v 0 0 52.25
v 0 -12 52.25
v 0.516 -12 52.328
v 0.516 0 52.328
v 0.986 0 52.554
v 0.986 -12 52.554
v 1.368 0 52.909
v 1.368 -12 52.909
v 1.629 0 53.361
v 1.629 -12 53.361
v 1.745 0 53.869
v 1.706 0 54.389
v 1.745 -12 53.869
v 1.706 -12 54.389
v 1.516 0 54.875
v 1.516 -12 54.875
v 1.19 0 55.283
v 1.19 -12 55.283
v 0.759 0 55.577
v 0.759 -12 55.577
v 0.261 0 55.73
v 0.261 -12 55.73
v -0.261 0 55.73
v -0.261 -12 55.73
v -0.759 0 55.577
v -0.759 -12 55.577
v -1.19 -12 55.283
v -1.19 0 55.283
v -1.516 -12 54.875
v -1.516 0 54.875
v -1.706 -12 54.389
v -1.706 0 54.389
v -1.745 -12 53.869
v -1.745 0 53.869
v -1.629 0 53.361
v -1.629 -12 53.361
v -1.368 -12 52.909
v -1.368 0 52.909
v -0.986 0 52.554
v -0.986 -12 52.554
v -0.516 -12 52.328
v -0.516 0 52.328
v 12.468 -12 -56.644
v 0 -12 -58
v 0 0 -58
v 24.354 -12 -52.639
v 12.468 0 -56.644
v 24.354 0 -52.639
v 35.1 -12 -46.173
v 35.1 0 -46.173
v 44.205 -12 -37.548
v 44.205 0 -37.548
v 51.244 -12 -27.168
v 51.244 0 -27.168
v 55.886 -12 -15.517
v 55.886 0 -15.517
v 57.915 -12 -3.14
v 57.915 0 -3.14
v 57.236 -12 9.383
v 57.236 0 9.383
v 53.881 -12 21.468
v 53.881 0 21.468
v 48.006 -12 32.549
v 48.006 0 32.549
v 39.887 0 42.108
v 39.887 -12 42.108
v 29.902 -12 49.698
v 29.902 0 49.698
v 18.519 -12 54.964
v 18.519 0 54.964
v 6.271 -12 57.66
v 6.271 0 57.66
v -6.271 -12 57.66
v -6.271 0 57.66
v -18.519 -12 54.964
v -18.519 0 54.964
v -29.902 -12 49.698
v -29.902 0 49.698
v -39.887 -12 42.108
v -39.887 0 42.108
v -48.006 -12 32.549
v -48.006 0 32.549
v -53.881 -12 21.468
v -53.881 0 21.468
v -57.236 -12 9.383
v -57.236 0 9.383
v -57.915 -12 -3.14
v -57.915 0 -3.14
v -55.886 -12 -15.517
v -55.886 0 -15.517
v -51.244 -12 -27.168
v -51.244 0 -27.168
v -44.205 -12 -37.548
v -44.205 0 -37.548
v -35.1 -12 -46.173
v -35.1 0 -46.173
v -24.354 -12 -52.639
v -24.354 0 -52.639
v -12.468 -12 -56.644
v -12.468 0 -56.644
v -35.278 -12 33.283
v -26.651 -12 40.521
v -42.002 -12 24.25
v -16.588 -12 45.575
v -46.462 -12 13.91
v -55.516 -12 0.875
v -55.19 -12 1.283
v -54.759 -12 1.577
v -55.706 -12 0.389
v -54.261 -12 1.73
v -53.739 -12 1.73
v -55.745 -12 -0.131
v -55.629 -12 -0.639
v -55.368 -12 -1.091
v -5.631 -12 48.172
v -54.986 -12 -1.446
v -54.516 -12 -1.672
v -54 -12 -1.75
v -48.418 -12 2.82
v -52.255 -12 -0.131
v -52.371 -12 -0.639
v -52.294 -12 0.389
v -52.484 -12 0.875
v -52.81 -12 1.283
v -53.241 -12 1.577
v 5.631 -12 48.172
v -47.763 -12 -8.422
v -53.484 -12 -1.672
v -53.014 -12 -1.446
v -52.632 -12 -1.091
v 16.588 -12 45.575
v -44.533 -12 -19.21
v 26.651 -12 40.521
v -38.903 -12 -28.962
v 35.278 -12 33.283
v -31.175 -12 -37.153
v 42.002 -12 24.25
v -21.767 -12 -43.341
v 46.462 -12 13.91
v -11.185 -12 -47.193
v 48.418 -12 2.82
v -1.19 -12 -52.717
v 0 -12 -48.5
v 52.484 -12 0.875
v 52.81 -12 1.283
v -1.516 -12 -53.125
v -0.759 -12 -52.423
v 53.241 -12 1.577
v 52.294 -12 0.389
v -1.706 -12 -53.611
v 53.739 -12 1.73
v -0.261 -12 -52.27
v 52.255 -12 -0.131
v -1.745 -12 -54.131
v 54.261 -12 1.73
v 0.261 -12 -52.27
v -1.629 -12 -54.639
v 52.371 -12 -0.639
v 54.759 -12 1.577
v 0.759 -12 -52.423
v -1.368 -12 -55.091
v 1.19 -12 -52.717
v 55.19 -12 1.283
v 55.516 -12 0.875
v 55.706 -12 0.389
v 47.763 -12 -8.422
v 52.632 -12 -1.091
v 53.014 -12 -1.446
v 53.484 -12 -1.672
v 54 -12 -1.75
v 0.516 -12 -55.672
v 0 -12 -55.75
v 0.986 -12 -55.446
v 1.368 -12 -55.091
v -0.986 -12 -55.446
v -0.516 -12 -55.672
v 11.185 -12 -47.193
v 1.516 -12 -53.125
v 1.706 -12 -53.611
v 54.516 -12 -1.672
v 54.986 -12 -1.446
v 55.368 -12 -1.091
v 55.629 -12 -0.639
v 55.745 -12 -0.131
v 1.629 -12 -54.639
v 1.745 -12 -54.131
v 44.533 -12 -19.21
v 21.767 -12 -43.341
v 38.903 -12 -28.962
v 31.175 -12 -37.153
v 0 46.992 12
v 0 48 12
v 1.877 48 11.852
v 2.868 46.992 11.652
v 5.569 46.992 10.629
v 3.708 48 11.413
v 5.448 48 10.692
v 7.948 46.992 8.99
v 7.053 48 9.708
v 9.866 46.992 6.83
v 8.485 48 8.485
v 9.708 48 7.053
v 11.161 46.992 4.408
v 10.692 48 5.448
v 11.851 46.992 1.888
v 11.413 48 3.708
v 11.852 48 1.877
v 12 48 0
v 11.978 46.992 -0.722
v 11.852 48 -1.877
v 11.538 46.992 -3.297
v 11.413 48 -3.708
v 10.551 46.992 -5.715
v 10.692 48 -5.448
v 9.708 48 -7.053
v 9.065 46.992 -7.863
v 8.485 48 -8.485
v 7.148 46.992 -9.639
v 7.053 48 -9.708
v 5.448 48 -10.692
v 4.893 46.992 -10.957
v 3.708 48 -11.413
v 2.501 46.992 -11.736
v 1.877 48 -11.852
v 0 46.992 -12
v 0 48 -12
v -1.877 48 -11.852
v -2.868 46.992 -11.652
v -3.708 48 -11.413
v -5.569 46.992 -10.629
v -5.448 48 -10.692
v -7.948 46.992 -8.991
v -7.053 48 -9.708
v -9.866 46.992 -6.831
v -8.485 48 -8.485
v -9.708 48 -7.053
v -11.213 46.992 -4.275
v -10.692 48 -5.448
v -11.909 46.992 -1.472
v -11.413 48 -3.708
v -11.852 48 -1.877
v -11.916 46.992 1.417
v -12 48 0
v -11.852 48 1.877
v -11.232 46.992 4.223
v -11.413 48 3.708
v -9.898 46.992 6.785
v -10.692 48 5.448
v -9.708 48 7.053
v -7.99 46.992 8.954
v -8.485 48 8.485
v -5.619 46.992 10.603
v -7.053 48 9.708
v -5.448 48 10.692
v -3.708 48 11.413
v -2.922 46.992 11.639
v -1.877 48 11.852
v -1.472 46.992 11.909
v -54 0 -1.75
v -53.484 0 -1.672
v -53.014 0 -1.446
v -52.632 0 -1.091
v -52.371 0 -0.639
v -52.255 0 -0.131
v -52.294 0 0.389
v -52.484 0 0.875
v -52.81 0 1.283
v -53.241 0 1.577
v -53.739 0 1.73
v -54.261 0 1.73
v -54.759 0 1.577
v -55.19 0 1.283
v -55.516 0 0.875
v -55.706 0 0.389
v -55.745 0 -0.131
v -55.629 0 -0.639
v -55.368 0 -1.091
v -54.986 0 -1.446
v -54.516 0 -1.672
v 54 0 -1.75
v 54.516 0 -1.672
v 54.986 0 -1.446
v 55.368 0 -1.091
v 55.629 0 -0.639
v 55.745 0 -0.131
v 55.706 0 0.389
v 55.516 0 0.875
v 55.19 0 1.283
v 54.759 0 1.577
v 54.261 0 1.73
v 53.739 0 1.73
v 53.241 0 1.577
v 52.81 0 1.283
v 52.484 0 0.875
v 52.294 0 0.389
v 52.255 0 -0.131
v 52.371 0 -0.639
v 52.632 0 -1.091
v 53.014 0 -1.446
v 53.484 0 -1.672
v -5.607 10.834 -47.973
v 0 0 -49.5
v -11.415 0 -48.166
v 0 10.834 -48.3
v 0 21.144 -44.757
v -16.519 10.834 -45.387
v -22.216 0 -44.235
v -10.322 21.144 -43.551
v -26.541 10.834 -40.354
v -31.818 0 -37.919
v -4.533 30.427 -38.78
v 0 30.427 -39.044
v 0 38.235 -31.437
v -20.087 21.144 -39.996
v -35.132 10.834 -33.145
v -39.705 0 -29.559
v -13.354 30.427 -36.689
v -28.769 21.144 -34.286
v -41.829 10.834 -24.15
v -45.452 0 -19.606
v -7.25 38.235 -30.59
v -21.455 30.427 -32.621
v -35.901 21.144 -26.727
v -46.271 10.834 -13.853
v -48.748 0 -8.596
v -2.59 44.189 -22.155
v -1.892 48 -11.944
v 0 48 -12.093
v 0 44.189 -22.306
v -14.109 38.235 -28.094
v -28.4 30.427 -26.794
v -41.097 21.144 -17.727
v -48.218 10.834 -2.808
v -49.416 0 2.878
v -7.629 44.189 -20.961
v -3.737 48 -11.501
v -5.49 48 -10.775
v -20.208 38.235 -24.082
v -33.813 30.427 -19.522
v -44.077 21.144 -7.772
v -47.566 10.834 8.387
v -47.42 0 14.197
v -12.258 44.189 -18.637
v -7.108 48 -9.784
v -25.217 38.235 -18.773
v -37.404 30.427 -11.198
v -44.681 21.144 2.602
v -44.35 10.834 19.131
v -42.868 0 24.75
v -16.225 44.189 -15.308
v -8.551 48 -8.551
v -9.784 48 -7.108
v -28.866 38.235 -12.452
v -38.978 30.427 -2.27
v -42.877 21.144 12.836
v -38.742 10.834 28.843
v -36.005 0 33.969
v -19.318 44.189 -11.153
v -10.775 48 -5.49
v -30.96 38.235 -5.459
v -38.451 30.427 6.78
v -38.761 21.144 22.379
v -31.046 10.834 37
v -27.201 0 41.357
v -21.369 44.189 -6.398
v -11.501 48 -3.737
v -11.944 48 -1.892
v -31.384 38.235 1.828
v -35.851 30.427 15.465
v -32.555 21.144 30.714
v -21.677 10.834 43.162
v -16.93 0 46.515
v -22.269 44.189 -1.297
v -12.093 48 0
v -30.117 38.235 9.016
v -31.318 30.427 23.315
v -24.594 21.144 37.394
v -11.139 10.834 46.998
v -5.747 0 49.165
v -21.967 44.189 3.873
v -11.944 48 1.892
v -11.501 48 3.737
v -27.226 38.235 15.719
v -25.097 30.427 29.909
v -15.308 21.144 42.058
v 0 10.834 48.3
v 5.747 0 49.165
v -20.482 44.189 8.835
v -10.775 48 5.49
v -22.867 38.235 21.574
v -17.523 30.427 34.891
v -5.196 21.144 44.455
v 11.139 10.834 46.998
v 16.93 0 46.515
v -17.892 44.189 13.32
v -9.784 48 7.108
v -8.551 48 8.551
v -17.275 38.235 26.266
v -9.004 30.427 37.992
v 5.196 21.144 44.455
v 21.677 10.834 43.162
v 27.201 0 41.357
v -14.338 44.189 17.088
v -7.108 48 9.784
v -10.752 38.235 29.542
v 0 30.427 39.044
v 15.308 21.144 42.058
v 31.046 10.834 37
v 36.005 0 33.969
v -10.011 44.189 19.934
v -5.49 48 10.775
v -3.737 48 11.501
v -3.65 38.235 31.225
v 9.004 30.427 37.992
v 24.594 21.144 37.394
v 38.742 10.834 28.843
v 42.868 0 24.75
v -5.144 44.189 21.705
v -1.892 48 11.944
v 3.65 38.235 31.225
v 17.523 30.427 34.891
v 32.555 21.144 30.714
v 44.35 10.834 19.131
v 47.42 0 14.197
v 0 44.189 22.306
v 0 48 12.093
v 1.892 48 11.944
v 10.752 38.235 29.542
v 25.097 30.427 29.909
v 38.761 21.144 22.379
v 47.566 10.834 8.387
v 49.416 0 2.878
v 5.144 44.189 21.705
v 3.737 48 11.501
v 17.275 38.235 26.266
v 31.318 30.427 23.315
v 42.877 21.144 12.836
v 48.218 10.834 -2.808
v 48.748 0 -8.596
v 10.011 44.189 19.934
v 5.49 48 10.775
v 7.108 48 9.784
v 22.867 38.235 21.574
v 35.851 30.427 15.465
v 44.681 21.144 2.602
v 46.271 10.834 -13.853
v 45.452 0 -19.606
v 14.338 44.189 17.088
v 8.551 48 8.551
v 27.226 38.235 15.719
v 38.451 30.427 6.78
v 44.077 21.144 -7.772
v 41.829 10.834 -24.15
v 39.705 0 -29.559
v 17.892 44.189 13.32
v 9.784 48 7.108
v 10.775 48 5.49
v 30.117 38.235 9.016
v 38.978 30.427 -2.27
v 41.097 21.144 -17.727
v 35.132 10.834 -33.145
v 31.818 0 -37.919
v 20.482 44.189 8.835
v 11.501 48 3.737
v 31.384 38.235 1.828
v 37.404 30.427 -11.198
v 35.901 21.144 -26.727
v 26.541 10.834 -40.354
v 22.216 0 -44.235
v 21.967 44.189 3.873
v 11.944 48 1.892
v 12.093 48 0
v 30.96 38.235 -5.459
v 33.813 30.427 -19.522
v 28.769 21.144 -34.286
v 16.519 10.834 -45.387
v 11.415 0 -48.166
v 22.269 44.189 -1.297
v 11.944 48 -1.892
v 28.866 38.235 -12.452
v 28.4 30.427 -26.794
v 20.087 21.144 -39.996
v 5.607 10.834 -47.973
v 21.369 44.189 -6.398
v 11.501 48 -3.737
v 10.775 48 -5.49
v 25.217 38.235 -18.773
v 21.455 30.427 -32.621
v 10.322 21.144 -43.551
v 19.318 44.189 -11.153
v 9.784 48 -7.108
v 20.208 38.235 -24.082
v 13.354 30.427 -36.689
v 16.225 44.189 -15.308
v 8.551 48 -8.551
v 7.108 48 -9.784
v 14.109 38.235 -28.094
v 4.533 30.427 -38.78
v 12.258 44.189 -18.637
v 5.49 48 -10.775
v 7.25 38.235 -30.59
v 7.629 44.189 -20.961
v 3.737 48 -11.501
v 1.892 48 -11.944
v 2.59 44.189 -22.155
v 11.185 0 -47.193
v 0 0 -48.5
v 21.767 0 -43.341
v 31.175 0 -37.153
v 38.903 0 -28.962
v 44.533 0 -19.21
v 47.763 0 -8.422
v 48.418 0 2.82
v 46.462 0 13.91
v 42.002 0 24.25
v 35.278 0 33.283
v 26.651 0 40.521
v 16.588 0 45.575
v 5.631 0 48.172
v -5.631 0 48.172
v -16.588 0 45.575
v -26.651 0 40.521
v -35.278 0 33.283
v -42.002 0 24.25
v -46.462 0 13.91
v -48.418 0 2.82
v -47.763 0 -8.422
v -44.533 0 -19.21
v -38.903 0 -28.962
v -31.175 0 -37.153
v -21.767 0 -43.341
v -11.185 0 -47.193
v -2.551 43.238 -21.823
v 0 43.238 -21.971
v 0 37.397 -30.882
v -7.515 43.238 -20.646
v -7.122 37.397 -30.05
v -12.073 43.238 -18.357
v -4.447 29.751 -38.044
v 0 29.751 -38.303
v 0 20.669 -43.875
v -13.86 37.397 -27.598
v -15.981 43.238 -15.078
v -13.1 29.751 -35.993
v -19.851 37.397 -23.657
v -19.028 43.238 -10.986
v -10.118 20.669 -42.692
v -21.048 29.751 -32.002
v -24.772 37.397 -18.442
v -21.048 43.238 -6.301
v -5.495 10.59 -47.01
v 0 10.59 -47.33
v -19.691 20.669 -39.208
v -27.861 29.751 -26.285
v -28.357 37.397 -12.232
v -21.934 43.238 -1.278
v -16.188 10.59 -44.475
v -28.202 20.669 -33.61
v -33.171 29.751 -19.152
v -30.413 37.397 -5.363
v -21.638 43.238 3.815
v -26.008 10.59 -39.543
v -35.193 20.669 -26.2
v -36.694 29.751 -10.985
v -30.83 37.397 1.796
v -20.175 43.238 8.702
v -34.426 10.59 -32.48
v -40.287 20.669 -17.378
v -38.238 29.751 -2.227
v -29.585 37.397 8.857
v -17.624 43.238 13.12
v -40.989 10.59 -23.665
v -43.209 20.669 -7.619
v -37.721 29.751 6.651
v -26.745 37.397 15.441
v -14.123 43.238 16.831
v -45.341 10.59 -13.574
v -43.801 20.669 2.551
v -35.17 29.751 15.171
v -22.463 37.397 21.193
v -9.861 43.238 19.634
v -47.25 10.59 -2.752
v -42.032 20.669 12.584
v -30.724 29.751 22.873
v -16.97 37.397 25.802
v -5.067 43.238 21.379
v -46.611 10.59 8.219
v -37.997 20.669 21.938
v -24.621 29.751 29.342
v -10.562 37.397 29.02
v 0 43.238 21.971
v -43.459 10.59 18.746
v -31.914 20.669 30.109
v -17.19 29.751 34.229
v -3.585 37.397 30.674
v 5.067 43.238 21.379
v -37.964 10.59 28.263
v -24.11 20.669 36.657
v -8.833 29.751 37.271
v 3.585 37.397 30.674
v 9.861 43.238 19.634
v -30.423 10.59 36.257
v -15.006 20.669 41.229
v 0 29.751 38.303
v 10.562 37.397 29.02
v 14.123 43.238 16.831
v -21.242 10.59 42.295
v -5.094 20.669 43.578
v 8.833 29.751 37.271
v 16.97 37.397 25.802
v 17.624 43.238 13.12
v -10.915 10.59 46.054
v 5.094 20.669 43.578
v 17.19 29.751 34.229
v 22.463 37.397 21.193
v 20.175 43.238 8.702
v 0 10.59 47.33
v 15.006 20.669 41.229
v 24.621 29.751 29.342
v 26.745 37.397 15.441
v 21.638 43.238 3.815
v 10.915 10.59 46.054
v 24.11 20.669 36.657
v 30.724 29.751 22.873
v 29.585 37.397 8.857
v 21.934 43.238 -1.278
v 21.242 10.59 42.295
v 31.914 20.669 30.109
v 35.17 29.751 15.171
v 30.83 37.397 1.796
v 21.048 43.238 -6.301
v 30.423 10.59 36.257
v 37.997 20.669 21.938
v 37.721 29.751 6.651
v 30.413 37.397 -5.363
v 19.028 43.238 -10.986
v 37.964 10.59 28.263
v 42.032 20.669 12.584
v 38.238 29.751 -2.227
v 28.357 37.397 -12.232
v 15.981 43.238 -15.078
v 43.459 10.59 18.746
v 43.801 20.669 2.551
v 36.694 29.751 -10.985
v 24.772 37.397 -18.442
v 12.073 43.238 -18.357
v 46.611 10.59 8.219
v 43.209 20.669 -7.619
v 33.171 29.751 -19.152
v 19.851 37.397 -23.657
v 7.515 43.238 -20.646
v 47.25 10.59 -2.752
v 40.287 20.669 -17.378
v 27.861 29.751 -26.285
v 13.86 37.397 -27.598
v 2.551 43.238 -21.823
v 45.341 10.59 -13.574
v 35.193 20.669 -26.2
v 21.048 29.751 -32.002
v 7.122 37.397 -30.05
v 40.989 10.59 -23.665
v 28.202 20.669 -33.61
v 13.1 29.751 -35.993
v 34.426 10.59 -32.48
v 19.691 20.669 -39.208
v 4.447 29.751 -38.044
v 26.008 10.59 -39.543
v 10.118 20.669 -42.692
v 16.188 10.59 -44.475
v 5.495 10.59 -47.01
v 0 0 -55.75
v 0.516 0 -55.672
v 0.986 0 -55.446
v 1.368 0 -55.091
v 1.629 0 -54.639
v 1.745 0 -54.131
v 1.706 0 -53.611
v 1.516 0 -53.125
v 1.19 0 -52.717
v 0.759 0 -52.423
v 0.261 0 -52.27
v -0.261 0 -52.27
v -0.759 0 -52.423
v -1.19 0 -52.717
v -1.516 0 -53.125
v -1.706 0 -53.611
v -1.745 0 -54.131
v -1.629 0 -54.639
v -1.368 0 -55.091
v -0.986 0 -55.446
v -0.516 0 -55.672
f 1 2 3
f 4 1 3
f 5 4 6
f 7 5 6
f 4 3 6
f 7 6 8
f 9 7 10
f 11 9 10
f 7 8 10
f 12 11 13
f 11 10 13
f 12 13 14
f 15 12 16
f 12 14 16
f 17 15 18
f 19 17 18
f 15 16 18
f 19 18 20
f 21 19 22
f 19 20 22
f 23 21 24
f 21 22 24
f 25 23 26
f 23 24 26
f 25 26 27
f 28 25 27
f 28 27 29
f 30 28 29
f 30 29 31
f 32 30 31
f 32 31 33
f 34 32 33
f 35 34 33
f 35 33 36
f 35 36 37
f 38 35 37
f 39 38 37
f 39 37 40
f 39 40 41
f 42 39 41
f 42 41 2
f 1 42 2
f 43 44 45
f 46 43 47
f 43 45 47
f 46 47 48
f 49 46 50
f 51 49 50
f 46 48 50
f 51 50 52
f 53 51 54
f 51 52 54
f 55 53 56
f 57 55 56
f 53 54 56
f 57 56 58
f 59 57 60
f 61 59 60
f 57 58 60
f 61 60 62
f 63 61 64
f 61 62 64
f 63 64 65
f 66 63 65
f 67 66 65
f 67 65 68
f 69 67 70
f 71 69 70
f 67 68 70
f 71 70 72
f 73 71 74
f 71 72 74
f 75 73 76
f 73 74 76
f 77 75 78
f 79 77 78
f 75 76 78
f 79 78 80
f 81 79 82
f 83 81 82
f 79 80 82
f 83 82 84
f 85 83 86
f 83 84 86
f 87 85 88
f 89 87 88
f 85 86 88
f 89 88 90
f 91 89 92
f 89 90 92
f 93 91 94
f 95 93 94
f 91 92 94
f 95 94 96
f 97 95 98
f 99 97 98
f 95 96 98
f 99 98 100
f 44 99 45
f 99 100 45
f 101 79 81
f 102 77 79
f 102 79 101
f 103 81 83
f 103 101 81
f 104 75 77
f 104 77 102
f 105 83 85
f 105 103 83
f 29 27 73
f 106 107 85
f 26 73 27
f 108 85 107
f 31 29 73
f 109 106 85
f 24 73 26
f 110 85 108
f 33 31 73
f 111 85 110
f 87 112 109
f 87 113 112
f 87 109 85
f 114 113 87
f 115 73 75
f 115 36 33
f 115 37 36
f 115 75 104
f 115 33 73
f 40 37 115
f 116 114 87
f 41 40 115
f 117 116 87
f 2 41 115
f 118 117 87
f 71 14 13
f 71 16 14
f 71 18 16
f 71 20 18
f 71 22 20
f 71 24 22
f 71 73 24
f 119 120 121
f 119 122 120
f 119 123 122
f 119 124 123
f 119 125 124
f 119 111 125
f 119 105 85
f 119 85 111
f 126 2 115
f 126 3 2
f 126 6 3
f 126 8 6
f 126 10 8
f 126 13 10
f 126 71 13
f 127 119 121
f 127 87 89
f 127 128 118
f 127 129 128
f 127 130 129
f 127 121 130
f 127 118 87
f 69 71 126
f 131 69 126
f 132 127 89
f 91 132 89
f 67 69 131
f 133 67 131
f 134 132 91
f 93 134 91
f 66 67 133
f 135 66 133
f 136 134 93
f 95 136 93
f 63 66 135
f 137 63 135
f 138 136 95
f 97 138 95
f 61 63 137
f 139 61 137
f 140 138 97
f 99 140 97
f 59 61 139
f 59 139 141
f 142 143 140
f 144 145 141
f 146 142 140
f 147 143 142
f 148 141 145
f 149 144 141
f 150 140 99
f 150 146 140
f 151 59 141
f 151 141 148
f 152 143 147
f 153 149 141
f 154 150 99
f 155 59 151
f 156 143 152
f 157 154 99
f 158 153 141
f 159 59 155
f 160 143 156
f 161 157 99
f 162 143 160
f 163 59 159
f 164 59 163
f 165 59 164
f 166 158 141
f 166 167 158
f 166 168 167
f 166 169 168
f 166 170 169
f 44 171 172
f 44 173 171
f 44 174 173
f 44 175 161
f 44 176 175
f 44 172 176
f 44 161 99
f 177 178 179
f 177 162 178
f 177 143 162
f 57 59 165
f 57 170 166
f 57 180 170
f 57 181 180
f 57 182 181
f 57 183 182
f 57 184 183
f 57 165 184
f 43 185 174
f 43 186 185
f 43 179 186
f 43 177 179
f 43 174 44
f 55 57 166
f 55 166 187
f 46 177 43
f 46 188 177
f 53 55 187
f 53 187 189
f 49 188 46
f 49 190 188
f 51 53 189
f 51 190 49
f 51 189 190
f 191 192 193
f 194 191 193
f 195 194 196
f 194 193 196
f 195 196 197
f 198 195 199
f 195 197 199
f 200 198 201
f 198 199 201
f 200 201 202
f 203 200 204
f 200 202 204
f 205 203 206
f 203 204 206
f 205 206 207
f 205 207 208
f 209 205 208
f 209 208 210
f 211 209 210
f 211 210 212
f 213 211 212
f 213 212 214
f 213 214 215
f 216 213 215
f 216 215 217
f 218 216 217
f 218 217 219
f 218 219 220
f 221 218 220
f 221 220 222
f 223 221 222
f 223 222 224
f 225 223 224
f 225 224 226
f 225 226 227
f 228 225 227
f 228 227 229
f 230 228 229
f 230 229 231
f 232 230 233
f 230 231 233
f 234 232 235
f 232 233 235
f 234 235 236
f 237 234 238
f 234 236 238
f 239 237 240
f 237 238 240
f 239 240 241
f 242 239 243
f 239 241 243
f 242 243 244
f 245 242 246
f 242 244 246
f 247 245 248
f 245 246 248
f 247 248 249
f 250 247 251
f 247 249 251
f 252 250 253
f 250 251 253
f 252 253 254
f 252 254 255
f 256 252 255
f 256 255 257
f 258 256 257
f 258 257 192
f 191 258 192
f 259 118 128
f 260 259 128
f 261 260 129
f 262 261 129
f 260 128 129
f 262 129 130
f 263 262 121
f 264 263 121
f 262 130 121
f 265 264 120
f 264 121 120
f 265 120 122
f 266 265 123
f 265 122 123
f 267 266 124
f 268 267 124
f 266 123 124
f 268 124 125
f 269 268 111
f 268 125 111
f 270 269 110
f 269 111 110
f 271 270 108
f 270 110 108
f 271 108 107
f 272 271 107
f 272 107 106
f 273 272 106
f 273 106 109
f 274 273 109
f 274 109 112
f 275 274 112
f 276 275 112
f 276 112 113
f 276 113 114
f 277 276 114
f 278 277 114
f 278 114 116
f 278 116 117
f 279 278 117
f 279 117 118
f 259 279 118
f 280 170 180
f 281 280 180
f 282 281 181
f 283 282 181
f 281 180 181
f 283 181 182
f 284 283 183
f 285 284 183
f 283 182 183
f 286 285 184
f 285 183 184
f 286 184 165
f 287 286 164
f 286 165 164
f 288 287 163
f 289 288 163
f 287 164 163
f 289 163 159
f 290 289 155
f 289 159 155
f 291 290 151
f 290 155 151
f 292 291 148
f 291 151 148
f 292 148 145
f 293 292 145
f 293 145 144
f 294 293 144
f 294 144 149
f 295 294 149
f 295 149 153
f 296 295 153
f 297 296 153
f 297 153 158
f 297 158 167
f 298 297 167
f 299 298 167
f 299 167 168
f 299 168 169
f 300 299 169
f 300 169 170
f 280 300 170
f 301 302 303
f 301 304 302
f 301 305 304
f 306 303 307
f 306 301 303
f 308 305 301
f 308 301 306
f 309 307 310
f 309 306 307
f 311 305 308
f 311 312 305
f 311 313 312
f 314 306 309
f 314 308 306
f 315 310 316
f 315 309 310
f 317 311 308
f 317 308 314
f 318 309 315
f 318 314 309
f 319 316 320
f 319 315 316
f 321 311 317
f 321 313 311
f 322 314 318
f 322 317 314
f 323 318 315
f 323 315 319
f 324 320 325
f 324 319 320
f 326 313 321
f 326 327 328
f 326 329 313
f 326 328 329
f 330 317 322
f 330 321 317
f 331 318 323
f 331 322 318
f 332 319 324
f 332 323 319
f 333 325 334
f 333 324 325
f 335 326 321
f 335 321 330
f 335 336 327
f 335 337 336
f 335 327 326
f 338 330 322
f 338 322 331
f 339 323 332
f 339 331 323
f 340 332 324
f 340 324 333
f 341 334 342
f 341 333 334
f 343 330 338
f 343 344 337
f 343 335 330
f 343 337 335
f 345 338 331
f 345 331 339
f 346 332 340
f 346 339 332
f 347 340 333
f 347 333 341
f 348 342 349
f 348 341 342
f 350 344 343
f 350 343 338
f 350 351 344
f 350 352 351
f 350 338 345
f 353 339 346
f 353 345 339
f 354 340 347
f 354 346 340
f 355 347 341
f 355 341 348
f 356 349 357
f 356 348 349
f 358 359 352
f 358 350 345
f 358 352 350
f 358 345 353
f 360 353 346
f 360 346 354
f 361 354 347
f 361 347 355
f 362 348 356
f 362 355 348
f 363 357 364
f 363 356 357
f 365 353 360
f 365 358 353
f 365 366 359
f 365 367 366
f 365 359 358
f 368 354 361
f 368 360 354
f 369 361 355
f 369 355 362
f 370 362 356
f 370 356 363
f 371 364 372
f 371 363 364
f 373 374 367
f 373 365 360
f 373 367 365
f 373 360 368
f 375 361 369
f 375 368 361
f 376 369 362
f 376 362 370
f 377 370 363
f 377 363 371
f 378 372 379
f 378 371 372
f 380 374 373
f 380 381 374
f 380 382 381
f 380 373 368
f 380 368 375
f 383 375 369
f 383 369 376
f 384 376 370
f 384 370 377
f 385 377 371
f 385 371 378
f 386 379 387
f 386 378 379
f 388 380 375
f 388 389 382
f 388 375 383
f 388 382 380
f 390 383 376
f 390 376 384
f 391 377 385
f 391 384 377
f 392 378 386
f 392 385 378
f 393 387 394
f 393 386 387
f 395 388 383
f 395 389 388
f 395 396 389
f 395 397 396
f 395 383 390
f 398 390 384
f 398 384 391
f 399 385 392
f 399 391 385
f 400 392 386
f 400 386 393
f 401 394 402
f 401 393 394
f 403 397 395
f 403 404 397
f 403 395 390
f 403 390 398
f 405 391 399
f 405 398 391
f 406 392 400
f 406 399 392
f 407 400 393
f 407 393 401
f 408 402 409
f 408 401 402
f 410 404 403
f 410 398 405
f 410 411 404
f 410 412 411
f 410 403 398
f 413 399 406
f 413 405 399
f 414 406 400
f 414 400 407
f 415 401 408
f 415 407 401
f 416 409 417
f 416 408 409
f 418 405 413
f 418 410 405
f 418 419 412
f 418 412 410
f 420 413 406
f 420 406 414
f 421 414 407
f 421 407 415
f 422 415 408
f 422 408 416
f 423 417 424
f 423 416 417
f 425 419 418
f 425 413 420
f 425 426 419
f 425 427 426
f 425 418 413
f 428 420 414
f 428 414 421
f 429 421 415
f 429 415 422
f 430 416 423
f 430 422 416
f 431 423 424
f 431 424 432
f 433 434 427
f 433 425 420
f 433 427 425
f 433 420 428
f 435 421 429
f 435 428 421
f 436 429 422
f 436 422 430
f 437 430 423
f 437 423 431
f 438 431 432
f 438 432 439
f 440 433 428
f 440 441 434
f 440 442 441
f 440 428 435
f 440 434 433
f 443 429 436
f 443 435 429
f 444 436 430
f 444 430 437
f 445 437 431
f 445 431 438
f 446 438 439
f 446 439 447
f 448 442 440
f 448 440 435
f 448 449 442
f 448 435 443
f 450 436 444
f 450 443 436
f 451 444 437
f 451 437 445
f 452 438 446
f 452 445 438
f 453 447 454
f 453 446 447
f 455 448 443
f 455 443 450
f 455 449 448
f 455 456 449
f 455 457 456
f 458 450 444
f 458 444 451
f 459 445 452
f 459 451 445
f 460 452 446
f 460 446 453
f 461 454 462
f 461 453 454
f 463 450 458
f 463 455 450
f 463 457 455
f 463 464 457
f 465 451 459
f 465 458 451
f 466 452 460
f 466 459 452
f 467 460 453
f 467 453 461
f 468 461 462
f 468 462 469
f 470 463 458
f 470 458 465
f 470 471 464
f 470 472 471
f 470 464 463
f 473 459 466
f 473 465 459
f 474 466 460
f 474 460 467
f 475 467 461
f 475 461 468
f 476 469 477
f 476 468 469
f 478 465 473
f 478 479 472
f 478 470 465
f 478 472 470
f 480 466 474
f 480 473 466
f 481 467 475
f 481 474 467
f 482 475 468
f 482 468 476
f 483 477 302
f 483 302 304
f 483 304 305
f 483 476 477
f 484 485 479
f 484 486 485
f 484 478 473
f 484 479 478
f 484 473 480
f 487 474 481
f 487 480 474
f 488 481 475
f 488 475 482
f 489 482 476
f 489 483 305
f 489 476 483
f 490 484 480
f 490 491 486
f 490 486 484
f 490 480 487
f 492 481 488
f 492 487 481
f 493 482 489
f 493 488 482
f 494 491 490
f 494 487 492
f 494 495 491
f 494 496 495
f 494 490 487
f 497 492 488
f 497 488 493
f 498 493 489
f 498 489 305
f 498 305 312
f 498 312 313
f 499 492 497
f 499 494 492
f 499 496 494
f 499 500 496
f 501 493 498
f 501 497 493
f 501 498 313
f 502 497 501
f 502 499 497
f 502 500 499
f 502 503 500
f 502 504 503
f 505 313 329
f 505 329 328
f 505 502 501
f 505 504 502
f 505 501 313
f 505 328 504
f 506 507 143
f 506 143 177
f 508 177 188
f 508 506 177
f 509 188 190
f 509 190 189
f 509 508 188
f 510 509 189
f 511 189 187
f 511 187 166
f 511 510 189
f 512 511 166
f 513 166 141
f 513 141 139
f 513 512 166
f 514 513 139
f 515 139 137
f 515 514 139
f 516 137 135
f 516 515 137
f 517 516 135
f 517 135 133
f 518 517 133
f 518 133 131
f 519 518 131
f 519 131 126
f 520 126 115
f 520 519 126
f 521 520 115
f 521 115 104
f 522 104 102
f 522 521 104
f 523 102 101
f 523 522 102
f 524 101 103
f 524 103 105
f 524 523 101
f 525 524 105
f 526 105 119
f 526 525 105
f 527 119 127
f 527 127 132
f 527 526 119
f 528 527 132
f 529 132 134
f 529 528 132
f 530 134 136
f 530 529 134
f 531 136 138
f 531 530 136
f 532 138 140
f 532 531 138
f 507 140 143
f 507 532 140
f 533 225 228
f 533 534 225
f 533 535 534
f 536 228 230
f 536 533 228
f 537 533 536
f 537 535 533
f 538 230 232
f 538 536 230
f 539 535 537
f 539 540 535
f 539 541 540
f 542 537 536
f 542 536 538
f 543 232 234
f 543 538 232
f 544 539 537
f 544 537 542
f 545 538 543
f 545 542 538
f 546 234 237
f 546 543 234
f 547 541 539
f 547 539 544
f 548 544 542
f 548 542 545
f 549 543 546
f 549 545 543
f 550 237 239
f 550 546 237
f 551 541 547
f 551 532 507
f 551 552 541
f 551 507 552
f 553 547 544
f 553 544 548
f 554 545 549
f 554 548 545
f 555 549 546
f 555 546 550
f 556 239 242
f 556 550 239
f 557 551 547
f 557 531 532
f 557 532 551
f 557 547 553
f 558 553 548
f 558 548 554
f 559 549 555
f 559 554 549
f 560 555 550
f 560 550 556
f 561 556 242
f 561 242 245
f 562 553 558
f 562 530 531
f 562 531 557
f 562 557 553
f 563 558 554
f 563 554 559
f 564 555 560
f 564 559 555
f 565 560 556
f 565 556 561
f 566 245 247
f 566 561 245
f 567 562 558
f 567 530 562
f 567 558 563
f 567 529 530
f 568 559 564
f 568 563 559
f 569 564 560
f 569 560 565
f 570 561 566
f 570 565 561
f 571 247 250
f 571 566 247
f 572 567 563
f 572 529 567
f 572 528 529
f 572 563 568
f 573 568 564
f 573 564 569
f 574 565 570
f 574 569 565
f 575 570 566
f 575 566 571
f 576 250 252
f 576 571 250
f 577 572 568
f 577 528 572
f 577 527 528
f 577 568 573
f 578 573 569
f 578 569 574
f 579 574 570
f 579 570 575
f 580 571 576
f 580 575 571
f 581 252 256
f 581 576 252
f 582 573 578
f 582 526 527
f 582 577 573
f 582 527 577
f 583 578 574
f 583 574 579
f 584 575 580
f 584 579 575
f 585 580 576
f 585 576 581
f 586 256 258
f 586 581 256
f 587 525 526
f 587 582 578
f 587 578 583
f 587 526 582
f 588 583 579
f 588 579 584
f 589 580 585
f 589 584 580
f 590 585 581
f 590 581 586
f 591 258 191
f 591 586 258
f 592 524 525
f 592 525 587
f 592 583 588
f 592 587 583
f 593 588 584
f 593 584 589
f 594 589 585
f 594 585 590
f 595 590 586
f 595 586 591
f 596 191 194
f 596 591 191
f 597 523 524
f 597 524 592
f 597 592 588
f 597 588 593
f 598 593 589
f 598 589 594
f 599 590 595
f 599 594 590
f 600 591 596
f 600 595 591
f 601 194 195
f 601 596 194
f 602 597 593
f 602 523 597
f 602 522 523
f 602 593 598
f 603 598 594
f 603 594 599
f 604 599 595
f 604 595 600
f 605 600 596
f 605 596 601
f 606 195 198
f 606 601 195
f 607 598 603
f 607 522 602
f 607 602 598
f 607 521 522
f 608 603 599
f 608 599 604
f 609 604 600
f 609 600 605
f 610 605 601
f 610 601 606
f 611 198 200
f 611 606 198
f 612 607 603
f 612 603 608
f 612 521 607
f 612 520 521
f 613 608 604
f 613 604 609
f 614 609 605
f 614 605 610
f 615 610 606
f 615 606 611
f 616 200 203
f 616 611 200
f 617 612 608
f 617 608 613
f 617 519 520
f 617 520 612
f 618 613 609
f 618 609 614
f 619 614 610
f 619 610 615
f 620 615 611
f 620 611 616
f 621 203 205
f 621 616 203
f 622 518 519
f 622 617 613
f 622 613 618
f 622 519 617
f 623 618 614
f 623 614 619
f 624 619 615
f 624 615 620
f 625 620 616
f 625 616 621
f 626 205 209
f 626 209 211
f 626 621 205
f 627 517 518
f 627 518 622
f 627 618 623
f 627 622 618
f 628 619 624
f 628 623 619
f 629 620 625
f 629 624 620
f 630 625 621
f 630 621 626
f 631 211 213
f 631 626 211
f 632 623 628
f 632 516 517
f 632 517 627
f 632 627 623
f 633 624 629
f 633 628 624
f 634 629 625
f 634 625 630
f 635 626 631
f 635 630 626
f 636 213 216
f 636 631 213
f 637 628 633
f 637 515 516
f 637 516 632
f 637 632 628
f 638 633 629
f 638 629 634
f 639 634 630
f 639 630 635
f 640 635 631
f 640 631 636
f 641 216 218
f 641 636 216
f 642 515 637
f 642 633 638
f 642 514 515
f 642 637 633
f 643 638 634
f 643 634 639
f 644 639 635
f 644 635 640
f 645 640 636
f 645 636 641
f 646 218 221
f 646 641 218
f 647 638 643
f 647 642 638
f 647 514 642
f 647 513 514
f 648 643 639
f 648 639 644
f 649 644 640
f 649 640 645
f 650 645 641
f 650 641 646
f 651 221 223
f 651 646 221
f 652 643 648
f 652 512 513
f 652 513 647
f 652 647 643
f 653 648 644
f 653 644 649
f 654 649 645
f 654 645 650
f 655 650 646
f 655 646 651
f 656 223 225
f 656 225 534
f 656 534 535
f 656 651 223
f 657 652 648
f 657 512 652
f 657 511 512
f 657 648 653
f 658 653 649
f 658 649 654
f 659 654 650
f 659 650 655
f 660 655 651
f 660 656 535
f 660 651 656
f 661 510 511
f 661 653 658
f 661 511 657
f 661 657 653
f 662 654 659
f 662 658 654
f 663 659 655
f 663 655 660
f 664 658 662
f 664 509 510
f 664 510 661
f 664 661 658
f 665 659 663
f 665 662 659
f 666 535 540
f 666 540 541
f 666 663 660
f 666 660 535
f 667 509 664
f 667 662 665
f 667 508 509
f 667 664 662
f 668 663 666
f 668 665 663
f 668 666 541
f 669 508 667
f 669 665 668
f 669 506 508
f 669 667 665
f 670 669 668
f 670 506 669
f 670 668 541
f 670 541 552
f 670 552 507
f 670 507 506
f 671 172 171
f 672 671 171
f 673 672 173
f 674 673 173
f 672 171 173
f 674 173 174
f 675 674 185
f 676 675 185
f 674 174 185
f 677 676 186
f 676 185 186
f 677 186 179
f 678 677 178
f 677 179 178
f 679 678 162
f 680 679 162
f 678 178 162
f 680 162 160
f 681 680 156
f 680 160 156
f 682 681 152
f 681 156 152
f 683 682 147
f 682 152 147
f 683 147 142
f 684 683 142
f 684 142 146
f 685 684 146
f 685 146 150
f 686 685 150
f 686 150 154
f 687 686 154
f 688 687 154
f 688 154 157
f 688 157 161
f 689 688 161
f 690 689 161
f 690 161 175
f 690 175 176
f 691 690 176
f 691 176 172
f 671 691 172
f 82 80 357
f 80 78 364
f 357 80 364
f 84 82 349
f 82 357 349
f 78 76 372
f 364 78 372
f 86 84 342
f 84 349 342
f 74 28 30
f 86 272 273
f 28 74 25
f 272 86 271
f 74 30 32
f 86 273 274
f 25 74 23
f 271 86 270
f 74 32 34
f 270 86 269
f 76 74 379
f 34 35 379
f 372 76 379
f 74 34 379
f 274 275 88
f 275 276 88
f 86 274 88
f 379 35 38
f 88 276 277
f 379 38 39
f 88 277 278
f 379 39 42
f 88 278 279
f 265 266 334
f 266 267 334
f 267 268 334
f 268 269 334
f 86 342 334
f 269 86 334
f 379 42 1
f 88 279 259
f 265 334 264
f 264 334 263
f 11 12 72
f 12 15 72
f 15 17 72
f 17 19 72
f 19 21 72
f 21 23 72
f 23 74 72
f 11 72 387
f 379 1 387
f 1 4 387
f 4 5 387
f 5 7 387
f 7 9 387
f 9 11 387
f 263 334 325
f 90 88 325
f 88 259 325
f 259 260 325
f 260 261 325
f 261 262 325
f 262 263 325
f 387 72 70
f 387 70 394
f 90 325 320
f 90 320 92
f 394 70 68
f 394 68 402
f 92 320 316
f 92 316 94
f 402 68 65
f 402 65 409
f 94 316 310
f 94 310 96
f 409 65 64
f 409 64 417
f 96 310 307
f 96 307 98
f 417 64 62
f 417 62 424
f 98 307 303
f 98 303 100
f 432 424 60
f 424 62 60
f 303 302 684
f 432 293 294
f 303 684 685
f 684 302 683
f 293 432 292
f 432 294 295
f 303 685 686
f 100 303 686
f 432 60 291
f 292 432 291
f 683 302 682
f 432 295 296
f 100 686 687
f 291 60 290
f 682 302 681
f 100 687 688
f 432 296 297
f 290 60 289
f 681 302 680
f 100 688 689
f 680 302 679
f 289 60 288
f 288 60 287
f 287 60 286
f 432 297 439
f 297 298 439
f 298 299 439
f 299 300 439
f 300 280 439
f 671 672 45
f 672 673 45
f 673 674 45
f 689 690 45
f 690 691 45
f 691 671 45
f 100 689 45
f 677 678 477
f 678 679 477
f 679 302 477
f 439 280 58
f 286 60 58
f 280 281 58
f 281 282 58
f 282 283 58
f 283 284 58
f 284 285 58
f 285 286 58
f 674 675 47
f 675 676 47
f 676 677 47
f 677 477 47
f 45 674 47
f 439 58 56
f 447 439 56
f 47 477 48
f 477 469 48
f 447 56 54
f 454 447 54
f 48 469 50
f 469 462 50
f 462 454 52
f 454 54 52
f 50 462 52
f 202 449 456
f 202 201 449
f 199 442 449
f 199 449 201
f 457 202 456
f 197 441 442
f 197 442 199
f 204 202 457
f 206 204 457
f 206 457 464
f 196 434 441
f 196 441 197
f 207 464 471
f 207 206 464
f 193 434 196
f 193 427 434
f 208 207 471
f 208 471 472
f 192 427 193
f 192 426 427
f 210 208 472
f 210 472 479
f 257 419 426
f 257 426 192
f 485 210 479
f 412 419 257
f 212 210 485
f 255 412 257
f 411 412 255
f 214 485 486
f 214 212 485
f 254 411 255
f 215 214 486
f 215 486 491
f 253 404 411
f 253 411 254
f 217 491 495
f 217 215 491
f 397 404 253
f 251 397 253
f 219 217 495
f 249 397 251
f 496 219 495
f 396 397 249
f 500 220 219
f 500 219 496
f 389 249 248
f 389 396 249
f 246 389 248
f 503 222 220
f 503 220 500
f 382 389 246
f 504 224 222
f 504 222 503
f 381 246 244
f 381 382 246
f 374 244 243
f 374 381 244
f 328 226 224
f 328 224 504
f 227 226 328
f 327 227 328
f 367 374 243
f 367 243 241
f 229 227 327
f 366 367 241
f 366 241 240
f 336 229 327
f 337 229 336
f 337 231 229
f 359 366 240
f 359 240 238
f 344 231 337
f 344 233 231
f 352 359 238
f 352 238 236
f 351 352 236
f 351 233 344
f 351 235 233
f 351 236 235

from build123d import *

# Parameters (mm, degrees)
CUT_EXTRUDE1_REACH  = 86.879
SKETCH2_R           = 12
SKETCH3_R           = 58
SKETCH3_R_2         = 48.5
BOSS_EXTRUDE1_DEPTH = 12
CUT_EXTRUDE2_REACH  = 103.627
SKETCH4_R           = 1.75


with BuildPart() as part:
    # Sketch1 → Revolve-Thin1 (revolve)
    with BuildSketch(Plane.XY, mode=Mode.PRIVATE) as revolve_thin1_sk:
        with BuildLine():
            Line((0, 47), (11.968709204, 47))
            ThreePointArc((11.968709204, 47), (38.293161246, 29.763800191), (48.5, 0))
            Line((48.5, 0), (49.5, 0))
            ThreePointArc((49.5, 0), (39.044030516, 30.427186546), (12.093386622, 48))
            Line((12.093386622, 48), (0, 48))
            Line((0, 48), (0, 47))
        make_face()
    revolve(revolve_thin1_sk.sketch.rotate(Axis((0, -100.538171033, 0), (0, 1, 0)), 90), axis=Axis((0, -100.538171033, 0), (0, 1, 0)))

    # Sketch2 → Cut-Extrude1 (cut, up to next)
    with BuildSketch(Plane(origin=(0, 48, 0), x_dir=(1, 0, 0), z_dir=(0, 1, 0)), mode=Mode.PRIVATE) as cut_extrude1_sk1:
        with Locations(Location((0, 0, 0), (0, 0, 270))):
            Circle(SKETCH2_R)
    cut_extrude1_tool1 = extrude(cut_extrude1_sk1.sketch, amount=-CUT_EXTRUDE1_REACH, mode=Mode.PRIVATE) & part.part
    add(cut_extrude1_tool1.solids().sort_by_distance((0, 48, 0))[0], mode=Mode.SUBTRACT)

    # Sketch3 → Boss-Extrude1 (add)
    with BuildSketch(Plane.XZ):
        with Locations(Location((0, 0, 0), (0, 0, 270))):
            Circle(SKETCH3_R)
        with Locations(Location((0, 0, 0), (0, 0, 270))):
            Circle(SKETCH3_R_2, mode=Mode.SUBTRACT)
    extrude(amount=BOSS_EXTRUDE1_DEPTH)

    # Sketch4 → Cut-Extrude2 (cut, up to next)
    with BuildSketch(Plane.XZ.offset(12), mode=Mode.PRIVATE) as cut_extrude2_sk1:
        with Locations(Location((0, 54, 0), (0, 0, 270))):
            Circle(SKETCH4_R)
    cut_extrude2_tool1 = extrude(cut_extrude2_sk1.sketch, amount=-CUT_EXTRUDE2_REACH, mode=Mode.PRIVATE) & part.part
    # Sketch4 → Cut-Extrude2 (cut, up to next)
    with BuildSketch(Plane.XZ.offset(12), mode=Mode.PRIVATE) as cut_extrude2_sk2:
        with Locations(Location((54, 0, 0), (0, 0, 270))):
            Circle(SKETCH4_R)
    cut_extrude2_tool2 = extrude(cut_extrude2_sk2.sketch, amount=-CUT_EXTRUDE2_REACH, mode=Mode.PRIVATE) & part.part
    # Sketch4 → Cut-Extrude2 (cut, up to next)
    with BuildSketch(Plane.XZ.offset(12), mode=Mode.PRIVATE) as cut_extrude2_sk3:
        with Locations(Location((-54, 0, 0), (0, 0, 270))):
            Circle(SKETCH4_R)
    cut_extrude2_tool3 = extrude(cut_extrude2_sk3.sketch, amount=-CUT_EXTRUDE2_REACH, mode=Mode.PRIVATE) & part.part
    # Sketch4 → Cut-Extrude2 (cut, up to next)
    with BuildSketch(Plane.XZ.offset(12), mode=Mode.PRIVATE) as cut_extrude2_sk4:
        with Locations(Location((0, -54, 0), (0, 0, 270))):
            Circle(SKETCH4_R)
    cut_extrude2_tool4 = extrude(cut_extrude2_sk4.sketch, amount=-CUT_EXTRUDE2_REACH, mode=Mode.PRIVATE) & part.part
    add(cut_extrude2_tool1.solids().sort_by_distance((0, -12, 54))[0], mode=Mode.SUBTRACT)
    add(cut_extrude2_tool2.solids().sort_by_distance((54, -12, 0))[0], mode=Mode.SUBTRACT)
    add(cut_extrude2_tool3.solids().sort_by_distance((-54, -12, 0))[0], mode=Mode.SUBTRACT)
    add(cut_extrude2_tool4.solids().sort_by_distance((0, -12, -54))[0], mode=Mode.SUBTRACT)


solid = part.part
